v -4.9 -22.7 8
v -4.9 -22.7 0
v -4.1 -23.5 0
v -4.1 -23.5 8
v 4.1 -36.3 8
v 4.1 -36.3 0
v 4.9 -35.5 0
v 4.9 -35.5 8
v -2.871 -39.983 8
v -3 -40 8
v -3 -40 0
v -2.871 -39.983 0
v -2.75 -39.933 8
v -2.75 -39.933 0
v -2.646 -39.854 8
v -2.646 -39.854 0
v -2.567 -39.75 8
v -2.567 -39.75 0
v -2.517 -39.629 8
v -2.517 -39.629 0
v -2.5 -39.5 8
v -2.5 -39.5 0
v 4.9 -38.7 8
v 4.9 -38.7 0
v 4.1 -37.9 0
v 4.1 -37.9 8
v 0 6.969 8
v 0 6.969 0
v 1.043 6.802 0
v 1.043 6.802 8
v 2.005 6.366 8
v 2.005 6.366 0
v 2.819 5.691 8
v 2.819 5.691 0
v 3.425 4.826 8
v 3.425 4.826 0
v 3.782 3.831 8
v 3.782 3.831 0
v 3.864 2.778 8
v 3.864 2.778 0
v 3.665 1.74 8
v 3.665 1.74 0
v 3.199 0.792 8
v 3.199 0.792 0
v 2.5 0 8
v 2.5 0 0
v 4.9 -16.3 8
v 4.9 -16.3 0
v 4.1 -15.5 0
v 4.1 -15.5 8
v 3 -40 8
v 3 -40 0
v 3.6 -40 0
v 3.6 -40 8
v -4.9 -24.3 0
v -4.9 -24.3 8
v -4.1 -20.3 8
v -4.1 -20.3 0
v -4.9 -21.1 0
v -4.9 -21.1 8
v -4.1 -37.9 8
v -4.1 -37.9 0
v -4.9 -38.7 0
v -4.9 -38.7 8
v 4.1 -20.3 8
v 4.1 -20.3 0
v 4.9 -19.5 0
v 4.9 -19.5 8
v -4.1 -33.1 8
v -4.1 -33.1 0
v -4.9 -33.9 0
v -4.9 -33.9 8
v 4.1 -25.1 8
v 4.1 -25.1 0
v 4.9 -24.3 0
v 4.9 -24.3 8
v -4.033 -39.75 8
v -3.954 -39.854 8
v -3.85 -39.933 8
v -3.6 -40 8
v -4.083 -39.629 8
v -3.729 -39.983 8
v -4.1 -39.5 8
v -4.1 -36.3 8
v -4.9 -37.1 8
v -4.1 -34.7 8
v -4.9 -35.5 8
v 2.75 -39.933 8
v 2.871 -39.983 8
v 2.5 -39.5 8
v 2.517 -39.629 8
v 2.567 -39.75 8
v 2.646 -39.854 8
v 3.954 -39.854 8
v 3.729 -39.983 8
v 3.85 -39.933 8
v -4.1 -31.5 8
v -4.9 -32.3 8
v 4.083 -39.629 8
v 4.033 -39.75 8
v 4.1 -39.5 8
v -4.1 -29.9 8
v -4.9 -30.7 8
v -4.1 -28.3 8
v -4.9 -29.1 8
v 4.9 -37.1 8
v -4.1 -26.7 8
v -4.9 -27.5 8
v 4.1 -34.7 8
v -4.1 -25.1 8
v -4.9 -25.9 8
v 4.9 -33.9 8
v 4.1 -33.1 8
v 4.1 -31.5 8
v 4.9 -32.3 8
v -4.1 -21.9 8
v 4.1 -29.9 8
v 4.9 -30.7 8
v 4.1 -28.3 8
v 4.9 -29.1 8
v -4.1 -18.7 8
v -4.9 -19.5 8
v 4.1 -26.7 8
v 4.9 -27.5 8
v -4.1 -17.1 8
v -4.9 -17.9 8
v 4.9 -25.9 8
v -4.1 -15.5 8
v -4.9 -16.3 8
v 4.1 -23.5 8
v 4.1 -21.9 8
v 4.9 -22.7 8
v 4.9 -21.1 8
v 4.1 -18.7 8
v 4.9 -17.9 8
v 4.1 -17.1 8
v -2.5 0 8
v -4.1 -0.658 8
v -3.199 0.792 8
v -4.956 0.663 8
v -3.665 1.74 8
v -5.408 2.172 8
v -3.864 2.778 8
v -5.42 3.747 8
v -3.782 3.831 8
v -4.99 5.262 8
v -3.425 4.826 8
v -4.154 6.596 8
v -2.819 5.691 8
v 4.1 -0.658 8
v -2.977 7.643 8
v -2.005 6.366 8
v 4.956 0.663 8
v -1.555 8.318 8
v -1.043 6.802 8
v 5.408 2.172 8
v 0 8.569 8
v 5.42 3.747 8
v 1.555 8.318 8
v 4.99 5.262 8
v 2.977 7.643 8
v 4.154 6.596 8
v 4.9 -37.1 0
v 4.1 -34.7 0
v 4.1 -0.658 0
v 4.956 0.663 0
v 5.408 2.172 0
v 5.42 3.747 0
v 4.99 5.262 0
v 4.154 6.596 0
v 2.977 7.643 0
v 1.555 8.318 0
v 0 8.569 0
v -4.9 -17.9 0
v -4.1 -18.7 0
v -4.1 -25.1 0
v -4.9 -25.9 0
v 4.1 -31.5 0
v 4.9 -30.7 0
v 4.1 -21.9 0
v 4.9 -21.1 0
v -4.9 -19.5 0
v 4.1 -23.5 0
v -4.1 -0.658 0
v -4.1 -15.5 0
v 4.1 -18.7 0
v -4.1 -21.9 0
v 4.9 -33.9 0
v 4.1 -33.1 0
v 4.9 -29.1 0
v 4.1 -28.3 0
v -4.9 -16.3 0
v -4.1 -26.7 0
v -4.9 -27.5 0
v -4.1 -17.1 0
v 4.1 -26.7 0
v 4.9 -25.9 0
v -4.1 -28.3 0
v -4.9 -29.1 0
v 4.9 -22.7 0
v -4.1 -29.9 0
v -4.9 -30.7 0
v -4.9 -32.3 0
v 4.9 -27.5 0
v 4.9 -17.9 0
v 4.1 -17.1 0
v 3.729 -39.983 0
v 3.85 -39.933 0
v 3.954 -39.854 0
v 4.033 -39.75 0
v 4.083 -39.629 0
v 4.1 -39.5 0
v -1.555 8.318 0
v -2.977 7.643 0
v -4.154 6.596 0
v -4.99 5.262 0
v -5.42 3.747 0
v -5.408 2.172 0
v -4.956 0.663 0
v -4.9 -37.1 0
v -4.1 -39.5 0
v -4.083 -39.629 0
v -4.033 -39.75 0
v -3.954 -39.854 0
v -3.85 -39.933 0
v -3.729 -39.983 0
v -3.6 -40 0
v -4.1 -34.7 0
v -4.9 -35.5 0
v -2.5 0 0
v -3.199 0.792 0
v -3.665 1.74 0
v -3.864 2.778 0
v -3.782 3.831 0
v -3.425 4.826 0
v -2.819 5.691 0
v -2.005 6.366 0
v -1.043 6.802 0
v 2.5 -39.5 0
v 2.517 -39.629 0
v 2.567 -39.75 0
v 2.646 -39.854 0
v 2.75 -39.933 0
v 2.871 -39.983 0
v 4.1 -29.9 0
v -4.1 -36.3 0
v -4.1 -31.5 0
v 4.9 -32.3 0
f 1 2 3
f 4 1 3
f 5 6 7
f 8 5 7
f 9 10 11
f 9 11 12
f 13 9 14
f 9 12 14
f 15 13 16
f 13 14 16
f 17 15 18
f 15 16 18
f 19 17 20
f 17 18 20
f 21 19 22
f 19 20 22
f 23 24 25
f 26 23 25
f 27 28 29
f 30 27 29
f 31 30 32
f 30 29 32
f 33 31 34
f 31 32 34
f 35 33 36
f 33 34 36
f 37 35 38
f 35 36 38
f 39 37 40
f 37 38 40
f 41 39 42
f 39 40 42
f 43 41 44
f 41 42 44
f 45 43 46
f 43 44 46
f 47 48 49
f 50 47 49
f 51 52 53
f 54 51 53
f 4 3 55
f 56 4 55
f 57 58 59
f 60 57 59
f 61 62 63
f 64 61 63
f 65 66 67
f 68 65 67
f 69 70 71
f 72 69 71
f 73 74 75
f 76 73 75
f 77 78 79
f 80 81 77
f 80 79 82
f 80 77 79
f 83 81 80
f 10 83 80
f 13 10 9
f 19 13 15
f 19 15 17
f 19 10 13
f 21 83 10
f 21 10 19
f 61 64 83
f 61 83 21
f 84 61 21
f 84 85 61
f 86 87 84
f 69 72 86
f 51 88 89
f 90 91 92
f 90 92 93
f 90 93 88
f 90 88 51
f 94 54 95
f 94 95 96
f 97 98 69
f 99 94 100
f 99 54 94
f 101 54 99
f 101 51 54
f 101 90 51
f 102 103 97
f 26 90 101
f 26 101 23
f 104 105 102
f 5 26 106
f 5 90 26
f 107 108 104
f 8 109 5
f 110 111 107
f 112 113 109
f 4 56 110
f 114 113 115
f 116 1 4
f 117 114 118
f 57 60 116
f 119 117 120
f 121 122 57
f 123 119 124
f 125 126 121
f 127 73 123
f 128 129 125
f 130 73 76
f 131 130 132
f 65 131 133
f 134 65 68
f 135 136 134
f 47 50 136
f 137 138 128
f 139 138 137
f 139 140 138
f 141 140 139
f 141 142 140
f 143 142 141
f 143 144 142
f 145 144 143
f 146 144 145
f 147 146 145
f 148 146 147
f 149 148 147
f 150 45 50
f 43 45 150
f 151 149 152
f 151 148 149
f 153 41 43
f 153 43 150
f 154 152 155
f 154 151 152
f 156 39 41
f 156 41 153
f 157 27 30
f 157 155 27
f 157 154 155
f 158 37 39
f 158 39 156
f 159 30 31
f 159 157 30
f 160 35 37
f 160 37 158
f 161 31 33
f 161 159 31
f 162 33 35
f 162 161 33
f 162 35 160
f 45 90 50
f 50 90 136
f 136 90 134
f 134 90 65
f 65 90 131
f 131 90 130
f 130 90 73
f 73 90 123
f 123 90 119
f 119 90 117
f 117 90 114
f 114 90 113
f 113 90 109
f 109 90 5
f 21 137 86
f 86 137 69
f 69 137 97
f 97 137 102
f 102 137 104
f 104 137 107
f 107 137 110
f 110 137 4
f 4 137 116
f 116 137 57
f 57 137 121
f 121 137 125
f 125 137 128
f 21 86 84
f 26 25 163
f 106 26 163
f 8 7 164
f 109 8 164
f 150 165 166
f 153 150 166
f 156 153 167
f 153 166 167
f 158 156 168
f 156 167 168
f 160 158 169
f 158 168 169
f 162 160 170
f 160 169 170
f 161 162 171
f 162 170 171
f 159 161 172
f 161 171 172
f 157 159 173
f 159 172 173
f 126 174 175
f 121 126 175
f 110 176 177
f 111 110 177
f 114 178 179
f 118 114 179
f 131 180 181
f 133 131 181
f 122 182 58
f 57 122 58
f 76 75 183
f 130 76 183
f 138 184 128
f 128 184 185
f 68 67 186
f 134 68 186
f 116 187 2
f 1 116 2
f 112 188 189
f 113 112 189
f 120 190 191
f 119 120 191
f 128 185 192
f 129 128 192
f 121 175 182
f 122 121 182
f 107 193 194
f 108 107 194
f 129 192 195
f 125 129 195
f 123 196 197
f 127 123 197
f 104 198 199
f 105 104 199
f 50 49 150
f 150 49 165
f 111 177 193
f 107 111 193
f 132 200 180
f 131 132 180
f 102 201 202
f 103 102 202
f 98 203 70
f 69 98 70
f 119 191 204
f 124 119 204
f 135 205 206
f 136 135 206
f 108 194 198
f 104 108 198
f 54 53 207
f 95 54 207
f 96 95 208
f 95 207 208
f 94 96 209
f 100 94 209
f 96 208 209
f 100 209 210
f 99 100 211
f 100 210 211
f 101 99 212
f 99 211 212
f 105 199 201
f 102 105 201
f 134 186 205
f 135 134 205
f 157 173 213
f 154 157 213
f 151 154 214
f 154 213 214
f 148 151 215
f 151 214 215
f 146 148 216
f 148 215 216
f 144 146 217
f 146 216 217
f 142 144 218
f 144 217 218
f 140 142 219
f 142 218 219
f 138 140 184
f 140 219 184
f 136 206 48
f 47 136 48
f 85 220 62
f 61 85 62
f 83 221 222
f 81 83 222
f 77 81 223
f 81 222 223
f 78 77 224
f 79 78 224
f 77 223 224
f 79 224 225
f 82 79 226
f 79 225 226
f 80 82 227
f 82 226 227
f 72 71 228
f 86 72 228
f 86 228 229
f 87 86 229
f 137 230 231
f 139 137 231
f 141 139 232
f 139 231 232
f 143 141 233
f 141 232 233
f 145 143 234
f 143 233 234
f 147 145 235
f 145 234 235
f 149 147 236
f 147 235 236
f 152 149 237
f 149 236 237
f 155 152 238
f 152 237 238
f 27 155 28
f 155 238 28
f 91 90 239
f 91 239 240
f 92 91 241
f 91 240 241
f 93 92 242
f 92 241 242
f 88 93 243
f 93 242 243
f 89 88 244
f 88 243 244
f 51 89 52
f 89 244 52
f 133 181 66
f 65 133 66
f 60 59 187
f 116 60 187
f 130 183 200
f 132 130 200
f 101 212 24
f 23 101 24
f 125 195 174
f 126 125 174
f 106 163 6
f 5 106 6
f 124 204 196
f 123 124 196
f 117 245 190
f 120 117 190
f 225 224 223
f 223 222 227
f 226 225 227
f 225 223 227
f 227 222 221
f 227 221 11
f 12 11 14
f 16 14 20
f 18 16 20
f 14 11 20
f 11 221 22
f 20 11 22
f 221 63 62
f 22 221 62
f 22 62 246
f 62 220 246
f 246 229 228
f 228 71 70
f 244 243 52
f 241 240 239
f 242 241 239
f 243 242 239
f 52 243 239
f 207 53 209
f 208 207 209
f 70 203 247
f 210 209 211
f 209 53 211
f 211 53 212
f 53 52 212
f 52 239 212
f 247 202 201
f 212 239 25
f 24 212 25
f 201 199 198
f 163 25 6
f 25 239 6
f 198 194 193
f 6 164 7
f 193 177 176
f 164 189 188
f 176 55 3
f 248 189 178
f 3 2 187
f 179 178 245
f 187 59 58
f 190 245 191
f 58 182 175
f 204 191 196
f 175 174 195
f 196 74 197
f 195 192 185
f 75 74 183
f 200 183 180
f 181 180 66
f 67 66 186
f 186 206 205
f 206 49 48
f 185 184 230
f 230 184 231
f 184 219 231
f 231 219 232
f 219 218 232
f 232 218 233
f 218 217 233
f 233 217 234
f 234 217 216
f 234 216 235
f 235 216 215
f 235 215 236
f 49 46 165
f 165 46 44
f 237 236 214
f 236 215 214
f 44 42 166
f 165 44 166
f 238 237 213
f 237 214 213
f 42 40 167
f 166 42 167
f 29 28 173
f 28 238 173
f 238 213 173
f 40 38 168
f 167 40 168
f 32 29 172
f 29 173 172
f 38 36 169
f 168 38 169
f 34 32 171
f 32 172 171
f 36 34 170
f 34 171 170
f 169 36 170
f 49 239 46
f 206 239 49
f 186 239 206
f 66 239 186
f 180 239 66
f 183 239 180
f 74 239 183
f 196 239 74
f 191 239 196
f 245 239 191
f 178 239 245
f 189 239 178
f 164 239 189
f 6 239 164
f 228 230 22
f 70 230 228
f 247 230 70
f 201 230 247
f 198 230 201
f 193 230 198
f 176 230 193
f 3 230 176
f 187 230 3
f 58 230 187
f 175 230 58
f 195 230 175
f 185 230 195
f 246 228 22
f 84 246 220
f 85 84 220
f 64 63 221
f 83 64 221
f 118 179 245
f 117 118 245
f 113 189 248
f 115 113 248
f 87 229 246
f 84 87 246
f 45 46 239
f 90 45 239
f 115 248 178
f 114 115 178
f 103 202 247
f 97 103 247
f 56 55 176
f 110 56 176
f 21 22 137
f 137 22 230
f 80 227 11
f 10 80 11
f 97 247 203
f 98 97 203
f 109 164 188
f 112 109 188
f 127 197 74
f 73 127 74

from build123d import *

# Parameters (mm, degrees)
F1_DEPTH = 8


with BuildPart() as f1:
    # F0 (on Top) → F1 (new body)
    with BuildSketch(Plane.XY):
        with BuildLine():
            ThreePointArc((0, 6.968736), (3.636642, 4.340564), (2.5, 0))
            Line((2.5, 0), (2.5, -39.5))
            ThreePointArc((2.5, -39.5), (2.646447, -39.853553), (3, -40))
            Line((3, -40), (3.6, -40))
            ThreePointArc((3.6, -40), (3.953553, -39.853553), (4.1, -39.5))
            Line((4.1, -39.5), (4.1, -37.9))
            Line((4.1, -37.9), (4.1, -36.3))
            Line((4.1, -36.3), (4.1, -34.7))
            Line((4.1, -34.7), (4.1, -33.1))
            Line((4.1, -33.1), (4.1, -31.5))
            Line((4.1, -31.5), (4.1, -29.9))
            Line((4.1, -29.9), (4.1, -28.3))
            Line((4.1, -28.3), (4.1, -26.7))
            Line((4.1, -26.7), (4.1, -25.1))
            Line((4.1, -25.1), (4.1, -23.5))
            Line((4.1, -23.5), (4.1, -21.9))
            Line((4.1, -21.9), (4.1, -20.3))
            Line((4.1, -20.3), (4.1, -18.7))
            Line((4.1, -18.7), (4.1, -17.1))
            Line((4.1, -17.1), (4.1, -15.5))
            Line((4.1, -15.5), (4.1, -0.658339))
            ThreePointArc((4.1, -0.658339), (4.989979, 5.261692), (0, 8.569099))
            Line((0, 8.569099), (0, 6.968736))
        make_face()
        with BuildLine():
            ThreePointArc((-2.5, 0), (-3.636642, 4.340564), (0, 6.968736))
            Line((0, 6.968736), (0, 8.569099))
            ThreePointArc((0, 8.569099), (-4.989979, 5.261692), (-4.1, -0.658339))
            Line((-4.1, -0.658339), (-4.1, -15.5))
            Line((-4.1, -15.5), (-4.1, -17.1))
            Line((-4.1, -17.1), (-4.1, -18.7))
            Line((-4.1, -18.7), (-4.1, -20.3))
            Line((-4.1, -20.3), (-4.1, -21.9))
            Line((-4.1, -21.9), (-4.1, -23.5))
            Line((-4.1, -23.5), (-4.1, -25.1))
            Line((-4.1, -25.1), (-4.1, -26.7))
            Line((-4.1, -26.7), (-4.1, -28.3))
            Line((-4.1, -28.3), (-4.1, -29.9))
            Line((-4.1, -29.9), (-4.1, -31.5))
            Line((-4.1, -31.5), (-4.1, -33.1))
            Line((-4.1, -33.1), (-4.1, -34.7))
            Line((-4.1, -34.7), (-4.1, -36.3))
            Line((-4.1, -36.3), (-4.1, -37.9))
            Line((-4.1, -37.9), (-4.1, -39.5))
            ThreePointArc((-4.1, -39.5), (-3.953553, -39.853553), (-3.6, -40))
            Line((-3.6, -40), (-3, -40))
            ThreePointArc((-3, -40), (-2.646447, -39.853553), (-2.5, -39.5))
            Line((-2.5, -39.5), (-2.5, 0))
        make_face()
        Polygon((4.9, -16.3), (4.1, -15.5), (4.1, -17.1), align=None)
        Polygon((-4.1, -17.1), (-4.1, -15.5), (-4.9, -16.3), align=None)
        Polygon((4.1, -37.9), (4.1, -39.5), (4.9, -38.7), align=None)
        Polygon((4.9, -17.9), (4.1, -17.1), (4.1, -18.7), align=None)
        Polygon((-4.1, -18.7), (-4.1, -17.1), (-4.9, -17.9), align=None)
        Polygon((4.1, -36.3), (4.1, -37.9), (4.9, -37.1), align=None)
        Polygon((4.9, -19.5), (4.1, -18.7), (4.1, -20.3), align=None)
        Polygon((-4.1, -20.3), (-4.1, -18.7), (-4.9, -19.5), align=None)
        Polygon((-4.9, -38.7), (-4.1, -39.5), (-4.1, -37.9), align=None)
        Polygon((4.1, -34.7), (4.1, -36.3), (4.9, -35.5), align=None)
        Polygon((4.9, -21.1), (4.1, -20.3), (4.1, -21.9), align=None)
        Polygon((-4.1, -21.9), (-4.1, -20.3), (-4.9, -21.1), align=None)
        Polygon((-4.9, -37.1), (-4.1, -37.9), (-4.1, -36.3), align=None)
        Polygon((4.1, -33.1), (4.1, -34.7), (4.9, -33.9), align=None)
        Polygon((4.9, -22.7), (4.1, -21.9), (4.1, -23.5), align=None)
        Polygon((-4.1, -23.5), (-4.1, -21.9), (-4.9, -22.7), align=None)
        Polygon((-4.9, -35.5), (-4.1, -36.3), (-4.1, -34.7), align=None)
        Polygon((4.1, -31.5), (4.1, -33.1), (4.9, -32.3), align=None)
        Polygon((4.9, -24.3), (4.1, -23.5), (4.1, -25.1), align=None)
        Polygon((-4.1, -25.1), (-4.1, -23.5), (-4.9, -24.3), align=None)
        Polygon((-4.9, -33.9), (-4.1, -34.7), (-4.1, -33.1), align=None)
        Polygon((4.1, -29.9), (4.1, -31.5), (4.9, -30.7), align=None)
        Polygon((4.9, -25.9), (4.1, -25.1), (4.1, -26.7), align=None)
        Polygon((-4.1, -26.7), (-4.1, -25.1), (-4.9, -25.9), align=None)
        Polygon((-4.9, -32.3), (-4.1, -33.1), (-4.1, -31.5), align=None)
        Polygon((4.1, -28.3), (4.1, -29.9), (4.9, -29.1), align=None)
        Polygon((4.9, -27.5), (4.1, -26.7), (4.1, -28.3), align=None)
        Polygon((-4.1, -28.3), (-4.1, -26.7), (-4.9, -27.5), align=None)
        Polygon((-4.9, -30.7), (-4.1, -31.5), (-4.1, -29.9), align=None)
        Polygon((-4.1, -29.9), (-4.1, -28.3), (-4.9, -29.1), align=None)
    extrude(amount=F1_DEPTH)


solid = f1.part
